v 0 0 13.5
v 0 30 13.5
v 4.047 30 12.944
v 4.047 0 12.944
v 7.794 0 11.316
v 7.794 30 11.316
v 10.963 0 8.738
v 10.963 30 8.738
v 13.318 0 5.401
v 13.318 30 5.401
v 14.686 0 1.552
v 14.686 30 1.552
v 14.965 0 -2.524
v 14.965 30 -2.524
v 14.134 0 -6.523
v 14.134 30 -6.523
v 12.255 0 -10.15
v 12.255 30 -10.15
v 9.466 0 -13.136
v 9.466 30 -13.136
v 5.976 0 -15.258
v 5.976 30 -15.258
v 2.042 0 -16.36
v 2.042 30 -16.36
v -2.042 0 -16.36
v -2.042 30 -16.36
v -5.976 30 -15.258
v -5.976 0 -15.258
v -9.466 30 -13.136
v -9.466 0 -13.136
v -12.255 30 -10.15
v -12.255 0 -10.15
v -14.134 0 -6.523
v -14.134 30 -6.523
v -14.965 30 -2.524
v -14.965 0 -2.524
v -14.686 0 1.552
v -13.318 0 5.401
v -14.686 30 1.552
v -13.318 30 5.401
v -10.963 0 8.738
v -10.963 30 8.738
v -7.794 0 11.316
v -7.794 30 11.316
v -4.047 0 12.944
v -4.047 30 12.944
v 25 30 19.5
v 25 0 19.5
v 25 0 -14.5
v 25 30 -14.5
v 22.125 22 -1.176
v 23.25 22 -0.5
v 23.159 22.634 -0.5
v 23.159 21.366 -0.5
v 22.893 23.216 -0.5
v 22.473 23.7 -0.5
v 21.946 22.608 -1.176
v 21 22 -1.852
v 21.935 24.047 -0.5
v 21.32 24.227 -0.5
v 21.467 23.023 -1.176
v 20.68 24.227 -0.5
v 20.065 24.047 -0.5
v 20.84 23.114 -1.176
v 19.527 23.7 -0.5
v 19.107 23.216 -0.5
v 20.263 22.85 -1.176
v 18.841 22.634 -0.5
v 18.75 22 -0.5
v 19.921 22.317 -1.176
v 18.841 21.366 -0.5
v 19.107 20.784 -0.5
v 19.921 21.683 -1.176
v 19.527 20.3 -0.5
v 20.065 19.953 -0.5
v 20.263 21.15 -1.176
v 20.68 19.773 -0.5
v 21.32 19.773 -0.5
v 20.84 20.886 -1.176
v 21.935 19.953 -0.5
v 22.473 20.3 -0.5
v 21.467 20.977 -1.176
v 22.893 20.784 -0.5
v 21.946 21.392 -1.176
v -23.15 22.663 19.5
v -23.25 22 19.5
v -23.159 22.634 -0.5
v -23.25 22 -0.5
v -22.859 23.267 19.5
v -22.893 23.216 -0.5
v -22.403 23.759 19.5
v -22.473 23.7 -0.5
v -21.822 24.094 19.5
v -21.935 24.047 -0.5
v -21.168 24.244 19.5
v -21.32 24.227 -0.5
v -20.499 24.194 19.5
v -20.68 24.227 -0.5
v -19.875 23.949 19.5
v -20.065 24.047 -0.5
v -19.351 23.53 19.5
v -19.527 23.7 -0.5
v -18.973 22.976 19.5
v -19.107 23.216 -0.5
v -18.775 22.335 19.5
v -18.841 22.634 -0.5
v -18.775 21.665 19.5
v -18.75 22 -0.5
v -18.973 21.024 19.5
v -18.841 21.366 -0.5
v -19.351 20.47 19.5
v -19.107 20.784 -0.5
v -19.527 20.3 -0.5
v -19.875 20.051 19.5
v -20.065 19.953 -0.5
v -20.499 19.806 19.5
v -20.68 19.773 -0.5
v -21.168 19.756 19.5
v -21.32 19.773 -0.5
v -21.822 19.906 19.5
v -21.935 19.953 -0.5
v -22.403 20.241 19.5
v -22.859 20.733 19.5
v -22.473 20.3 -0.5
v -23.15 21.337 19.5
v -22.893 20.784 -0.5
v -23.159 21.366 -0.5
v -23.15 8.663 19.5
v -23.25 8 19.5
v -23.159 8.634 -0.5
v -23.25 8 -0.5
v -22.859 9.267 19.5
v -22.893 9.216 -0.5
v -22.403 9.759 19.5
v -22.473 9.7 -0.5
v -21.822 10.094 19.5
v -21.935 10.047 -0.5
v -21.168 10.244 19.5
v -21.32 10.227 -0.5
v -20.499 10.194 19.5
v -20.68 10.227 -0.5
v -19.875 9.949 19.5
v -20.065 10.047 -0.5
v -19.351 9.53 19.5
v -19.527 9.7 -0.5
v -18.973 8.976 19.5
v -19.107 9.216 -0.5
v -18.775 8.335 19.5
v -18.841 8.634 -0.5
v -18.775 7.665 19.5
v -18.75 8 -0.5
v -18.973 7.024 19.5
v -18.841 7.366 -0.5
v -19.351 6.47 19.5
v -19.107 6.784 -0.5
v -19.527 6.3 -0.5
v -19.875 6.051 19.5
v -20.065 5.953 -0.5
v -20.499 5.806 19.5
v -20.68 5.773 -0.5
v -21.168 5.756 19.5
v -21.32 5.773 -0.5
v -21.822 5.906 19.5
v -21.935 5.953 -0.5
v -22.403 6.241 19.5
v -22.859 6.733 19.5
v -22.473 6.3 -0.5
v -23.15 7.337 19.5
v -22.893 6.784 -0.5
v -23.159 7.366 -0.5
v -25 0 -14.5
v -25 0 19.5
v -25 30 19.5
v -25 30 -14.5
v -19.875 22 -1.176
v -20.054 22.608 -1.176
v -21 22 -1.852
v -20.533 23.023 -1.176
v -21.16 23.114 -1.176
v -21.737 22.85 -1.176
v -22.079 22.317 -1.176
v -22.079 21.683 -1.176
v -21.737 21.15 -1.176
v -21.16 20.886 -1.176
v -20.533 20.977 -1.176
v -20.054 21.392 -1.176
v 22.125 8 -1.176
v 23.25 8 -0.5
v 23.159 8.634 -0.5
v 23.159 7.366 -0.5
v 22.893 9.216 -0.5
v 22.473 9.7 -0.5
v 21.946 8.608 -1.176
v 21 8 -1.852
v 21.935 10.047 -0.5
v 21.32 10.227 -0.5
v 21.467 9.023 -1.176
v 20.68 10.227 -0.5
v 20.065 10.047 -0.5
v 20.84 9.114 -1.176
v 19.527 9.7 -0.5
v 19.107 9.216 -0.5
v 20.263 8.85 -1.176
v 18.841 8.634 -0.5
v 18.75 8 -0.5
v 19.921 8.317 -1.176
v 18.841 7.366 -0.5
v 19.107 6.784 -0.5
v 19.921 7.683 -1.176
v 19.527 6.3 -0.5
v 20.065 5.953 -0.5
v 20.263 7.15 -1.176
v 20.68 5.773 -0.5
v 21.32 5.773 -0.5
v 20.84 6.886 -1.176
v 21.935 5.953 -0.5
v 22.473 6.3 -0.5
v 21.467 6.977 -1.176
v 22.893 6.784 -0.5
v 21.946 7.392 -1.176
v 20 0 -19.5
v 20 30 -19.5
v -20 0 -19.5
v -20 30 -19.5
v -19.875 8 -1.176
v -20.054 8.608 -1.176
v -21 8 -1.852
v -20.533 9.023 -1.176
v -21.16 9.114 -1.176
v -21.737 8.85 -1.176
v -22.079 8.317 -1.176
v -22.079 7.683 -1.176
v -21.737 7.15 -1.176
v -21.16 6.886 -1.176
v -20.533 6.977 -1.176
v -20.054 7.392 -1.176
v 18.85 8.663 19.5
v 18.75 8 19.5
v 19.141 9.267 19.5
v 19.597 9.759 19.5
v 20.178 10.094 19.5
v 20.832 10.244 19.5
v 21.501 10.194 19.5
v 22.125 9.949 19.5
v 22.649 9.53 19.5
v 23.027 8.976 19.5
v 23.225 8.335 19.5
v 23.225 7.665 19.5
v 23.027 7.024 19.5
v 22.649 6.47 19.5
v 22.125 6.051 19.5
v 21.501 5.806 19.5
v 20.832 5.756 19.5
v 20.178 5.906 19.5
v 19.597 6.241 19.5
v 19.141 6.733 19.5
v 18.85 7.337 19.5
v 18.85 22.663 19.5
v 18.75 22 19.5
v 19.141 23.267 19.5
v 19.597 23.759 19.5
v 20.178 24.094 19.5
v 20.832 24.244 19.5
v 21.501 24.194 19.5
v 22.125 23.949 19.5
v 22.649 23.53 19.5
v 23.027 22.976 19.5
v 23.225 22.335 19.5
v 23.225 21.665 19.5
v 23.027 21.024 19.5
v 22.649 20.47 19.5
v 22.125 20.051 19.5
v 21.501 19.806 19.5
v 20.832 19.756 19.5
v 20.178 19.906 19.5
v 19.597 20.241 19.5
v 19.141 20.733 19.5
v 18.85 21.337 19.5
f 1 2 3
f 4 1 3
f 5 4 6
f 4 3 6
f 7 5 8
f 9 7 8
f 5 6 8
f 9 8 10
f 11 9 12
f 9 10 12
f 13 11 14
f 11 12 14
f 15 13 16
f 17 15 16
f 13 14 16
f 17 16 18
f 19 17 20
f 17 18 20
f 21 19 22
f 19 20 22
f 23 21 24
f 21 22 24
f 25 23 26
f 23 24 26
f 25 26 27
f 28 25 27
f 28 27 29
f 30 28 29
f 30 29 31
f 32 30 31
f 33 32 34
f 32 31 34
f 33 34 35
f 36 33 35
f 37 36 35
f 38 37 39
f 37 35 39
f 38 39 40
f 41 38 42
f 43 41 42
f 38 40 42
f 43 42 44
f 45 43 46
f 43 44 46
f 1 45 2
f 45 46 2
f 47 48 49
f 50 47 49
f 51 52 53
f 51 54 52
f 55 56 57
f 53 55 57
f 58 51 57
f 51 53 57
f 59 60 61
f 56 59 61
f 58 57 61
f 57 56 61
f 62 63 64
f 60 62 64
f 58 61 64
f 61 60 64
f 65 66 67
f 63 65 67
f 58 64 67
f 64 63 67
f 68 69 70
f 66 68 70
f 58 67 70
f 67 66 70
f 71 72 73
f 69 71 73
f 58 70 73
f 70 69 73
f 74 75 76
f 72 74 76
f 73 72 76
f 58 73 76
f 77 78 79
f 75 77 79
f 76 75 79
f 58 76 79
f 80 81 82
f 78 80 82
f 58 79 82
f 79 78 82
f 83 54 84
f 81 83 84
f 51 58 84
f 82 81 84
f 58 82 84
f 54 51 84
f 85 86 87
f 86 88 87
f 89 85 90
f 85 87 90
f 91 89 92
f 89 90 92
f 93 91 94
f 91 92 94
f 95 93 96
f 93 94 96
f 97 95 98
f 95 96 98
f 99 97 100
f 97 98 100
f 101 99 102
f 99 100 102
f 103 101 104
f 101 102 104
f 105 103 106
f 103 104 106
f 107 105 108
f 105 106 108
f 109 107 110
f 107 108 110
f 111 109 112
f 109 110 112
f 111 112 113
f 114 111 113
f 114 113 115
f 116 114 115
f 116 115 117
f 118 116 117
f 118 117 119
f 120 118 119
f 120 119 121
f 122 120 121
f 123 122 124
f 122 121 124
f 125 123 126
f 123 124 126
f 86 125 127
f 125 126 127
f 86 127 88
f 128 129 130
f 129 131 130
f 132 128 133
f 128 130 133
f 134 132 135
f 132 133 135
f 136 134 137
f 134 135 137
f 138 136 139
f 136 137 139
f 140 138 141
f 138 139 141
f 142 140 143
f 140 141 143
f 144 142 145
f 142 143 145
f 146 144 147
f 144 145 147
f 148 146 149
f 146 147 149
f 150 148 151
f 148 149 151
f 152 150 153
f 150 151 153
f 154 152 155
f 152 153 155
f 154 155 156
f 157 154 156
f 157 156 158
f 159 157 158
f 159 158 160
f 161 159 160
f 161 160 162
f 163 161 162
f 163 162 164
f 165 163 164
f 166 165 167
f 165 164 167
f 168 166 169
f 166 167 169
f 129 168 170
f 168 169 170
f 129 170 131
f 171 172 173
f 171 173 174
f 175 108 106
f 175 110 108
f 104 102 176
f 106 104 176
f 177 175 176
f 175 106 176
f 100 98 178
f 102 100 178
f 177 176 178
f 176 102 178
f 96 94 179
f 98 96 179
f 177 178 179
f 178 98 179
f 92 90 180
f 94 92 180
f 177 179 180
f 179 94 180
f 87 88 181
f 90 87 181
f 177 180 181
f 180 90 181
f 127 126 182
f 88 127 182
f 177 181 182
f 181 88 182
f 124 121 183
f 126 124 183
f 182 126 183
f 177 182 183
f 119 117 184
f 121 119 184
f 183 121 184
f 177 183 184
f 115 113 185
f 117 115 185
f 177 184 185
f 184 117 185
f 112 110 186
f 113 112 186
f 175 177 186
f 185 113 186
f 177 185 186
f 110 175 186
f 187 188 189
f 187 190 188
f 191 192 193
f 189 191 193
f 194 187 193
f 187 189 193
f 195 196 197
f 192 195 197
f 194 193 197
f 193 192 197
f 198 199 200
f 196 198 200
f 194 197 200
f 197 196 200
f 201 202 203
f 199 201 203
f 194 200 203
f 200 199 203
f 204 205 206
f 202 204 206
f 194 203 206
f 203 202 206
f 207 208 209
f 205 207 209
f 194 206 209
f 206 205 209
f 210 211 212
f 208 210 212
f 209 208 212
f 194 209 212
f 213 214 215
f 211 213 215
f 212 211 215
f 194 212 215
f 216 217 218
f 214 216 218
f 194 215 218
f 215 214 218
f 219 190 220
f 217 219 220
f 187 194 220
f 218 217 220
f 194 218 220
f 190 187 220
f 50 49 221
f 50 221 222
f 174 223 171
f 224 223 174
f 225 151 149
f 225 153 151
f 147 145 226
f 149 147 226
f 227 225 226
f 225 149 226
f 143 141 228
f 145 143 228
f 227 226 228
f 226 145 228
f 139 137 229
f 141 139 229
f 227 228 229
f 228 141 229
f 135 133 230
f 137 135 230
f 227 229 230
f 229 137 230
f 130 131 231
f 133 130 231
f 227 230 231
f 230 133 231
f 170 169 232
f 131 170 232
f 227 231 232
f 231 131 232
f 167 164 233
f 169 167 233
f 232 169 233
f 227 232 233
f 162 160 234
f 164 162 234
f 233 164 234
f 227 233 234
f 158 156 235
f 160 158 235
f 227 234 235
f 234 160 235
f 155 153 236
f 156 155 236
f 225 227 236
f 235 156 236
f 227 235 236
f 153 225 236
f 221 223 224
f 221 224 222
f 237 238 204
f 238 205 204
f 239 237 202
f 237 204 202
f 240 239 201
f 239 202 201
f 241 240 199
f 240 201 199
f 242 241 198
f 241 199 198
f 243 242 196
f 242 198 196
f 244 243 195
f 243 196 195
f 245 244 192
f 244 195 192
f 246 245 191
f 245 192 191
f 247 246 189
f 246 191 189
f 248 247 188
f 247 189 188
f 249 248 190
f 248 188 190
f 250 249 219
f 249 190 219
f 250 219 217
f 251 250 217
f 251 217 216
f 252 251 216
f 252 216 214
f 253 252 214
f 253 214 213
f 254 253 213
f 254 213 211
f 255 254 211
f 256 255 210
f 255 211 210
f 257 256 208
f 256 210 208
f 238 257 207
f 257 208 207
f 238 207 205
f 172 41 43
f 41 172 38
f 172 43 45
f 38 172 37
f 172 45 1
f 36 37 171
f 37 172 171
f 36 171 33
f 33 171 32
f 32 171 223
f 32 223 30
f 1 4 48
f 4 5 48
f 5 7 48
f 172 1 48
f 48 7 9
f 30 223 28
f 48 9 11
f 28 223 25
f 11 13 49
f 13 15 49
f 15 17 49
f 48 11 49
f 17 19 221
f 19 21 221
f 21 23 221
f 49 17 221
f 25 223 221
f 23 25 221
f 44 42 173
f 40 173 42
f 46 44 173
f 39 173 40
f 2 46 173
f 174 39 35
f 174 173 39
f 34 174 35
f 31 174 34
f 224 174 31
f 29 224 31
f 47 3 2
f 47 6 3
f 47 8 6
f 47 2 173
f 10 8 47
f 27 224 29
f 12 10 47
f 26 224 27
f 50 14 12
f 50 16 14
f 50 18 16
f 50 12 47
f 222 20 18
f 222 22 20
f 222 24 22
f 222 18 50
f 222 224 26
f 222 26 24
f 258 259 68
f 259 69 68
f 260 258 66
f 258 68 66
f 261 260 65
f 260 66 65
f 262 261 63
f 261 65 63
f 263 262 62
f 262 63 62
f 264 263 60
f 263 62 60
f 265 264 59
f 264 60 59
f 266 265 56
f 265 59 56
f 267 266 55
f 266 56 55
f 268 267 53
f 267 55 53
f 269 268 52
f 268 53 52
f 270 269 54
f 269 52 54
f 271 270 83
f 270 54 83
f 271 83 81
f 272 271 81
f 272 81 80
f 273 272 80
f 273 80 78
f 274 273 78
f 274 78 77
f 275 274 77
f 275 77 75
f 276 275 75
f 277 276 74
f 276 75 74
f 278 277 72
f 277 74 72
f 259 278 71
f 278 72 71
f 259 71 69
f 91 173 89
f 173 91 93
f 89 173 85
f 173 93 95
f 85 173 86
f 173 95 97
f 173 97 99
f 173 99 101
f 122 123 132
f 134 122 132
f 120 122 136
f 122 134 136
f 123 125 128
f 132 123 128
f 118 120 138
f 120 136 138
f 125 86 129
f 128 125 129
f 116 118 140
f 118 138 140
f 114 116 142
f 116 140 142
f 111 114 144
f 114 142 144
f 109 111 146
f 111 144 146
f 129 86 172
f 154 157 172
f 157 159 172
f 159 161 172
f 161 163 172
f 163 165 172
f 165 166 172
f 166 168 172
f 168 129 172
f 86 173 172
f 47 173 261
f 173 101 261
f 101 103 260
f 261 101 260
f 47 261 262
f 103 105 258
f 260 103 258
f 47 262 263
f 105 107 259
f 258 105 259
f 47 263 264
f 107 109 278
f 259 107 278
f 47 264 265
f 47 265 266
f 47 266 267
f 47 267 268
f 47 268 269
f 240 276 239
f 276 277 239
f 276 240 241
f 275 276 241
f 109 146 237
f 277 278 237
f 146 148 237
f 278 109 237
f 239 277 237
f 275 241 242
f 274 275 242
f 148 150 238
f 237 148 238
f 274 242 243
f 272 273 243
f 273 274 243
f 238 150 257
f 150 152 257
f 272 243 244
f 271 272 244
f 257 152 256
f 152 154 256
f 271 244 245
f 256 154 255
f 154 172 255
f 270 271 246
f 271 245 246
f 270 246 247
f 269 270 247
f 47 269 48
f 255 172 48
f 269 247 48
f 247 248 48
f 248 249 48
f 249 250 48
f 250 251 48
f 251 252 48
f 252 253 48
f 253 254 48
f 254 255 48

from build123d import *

# Parameters (mm, degrees)
SKETCH_1_W             = 50
SKETCH_1_H             = 39
EXTRUDE_1_DEPTH        = 30
SKETCH_2_R             = 15
CUT_EXTRUDE_1_DEPTH    = 30
CHAMFER_1_SIZE         = 5
HOLE_WIZARD_M4_1_D     = 4.5
HOLE_WIZARD_M4_1_DEPTH = 20
HOLE_WIZARD_M4_1_TIP   = 1.351936393


with BuildPart() as part:
    # 스케치1 → 보스-돌출1 (new body)
    with BuildSketch(Plane(origin=(0, 0, 0), x_dir=(1, 0, 0), z_dir=(0, 1, 0))):
        Rectangle(SKETCH_1_W, SKETCH_1_H)
    extrude(amount=EXTRUDE_1_DEPTH)

    # 스케치2 → 컷-돌출1 (cut)
    with BuildSketch(Plane(origin=(0, 30, 0), x_dir=(1, 0, 0), z_dir=(0, 1, 0))):
        with Locations(Location((0, 1.5, 0), (0, 0, 270))):
            Circle(SKETCH_2_R)
    extrude(amount=-CUT_EXTRUDE_1_DEPTH, mode=Mode.SUBTRACT)

    # 모따기1
    chamfer_1_edges = [part.edges().sort_by_distance(p)[0] for p in [
        (-25, 15, -19.5),
        (25, 15, -19.5),
    ]]
    chamfer(chamfer_1_edges, length=CHAMFER_1_SIZE)

    # M4 여유 구멍1
    with Locations(Plane.XY.offset(19.5)):
        with Locations((-21, 22), (21, 22), (21, 8), (-21, 8)):
            Hole(HOLE_WIZARD_M4_1_D / 2, depth=HOLE_WIZARD_M4_1_DEPTH)
            with Locations((0, 0, -(HOLE_WIZARD_M4_1_DEPTH + HOLE_WIZARD_M4_1_TIP / 2))):  # 118° drill point
                Cone(0, HOLE_WIZARD_M4_1_D / 2, HOLE_WIZARD_M4_1_TIP, mode=Mode.SUBTRACT)


solid = part.part
